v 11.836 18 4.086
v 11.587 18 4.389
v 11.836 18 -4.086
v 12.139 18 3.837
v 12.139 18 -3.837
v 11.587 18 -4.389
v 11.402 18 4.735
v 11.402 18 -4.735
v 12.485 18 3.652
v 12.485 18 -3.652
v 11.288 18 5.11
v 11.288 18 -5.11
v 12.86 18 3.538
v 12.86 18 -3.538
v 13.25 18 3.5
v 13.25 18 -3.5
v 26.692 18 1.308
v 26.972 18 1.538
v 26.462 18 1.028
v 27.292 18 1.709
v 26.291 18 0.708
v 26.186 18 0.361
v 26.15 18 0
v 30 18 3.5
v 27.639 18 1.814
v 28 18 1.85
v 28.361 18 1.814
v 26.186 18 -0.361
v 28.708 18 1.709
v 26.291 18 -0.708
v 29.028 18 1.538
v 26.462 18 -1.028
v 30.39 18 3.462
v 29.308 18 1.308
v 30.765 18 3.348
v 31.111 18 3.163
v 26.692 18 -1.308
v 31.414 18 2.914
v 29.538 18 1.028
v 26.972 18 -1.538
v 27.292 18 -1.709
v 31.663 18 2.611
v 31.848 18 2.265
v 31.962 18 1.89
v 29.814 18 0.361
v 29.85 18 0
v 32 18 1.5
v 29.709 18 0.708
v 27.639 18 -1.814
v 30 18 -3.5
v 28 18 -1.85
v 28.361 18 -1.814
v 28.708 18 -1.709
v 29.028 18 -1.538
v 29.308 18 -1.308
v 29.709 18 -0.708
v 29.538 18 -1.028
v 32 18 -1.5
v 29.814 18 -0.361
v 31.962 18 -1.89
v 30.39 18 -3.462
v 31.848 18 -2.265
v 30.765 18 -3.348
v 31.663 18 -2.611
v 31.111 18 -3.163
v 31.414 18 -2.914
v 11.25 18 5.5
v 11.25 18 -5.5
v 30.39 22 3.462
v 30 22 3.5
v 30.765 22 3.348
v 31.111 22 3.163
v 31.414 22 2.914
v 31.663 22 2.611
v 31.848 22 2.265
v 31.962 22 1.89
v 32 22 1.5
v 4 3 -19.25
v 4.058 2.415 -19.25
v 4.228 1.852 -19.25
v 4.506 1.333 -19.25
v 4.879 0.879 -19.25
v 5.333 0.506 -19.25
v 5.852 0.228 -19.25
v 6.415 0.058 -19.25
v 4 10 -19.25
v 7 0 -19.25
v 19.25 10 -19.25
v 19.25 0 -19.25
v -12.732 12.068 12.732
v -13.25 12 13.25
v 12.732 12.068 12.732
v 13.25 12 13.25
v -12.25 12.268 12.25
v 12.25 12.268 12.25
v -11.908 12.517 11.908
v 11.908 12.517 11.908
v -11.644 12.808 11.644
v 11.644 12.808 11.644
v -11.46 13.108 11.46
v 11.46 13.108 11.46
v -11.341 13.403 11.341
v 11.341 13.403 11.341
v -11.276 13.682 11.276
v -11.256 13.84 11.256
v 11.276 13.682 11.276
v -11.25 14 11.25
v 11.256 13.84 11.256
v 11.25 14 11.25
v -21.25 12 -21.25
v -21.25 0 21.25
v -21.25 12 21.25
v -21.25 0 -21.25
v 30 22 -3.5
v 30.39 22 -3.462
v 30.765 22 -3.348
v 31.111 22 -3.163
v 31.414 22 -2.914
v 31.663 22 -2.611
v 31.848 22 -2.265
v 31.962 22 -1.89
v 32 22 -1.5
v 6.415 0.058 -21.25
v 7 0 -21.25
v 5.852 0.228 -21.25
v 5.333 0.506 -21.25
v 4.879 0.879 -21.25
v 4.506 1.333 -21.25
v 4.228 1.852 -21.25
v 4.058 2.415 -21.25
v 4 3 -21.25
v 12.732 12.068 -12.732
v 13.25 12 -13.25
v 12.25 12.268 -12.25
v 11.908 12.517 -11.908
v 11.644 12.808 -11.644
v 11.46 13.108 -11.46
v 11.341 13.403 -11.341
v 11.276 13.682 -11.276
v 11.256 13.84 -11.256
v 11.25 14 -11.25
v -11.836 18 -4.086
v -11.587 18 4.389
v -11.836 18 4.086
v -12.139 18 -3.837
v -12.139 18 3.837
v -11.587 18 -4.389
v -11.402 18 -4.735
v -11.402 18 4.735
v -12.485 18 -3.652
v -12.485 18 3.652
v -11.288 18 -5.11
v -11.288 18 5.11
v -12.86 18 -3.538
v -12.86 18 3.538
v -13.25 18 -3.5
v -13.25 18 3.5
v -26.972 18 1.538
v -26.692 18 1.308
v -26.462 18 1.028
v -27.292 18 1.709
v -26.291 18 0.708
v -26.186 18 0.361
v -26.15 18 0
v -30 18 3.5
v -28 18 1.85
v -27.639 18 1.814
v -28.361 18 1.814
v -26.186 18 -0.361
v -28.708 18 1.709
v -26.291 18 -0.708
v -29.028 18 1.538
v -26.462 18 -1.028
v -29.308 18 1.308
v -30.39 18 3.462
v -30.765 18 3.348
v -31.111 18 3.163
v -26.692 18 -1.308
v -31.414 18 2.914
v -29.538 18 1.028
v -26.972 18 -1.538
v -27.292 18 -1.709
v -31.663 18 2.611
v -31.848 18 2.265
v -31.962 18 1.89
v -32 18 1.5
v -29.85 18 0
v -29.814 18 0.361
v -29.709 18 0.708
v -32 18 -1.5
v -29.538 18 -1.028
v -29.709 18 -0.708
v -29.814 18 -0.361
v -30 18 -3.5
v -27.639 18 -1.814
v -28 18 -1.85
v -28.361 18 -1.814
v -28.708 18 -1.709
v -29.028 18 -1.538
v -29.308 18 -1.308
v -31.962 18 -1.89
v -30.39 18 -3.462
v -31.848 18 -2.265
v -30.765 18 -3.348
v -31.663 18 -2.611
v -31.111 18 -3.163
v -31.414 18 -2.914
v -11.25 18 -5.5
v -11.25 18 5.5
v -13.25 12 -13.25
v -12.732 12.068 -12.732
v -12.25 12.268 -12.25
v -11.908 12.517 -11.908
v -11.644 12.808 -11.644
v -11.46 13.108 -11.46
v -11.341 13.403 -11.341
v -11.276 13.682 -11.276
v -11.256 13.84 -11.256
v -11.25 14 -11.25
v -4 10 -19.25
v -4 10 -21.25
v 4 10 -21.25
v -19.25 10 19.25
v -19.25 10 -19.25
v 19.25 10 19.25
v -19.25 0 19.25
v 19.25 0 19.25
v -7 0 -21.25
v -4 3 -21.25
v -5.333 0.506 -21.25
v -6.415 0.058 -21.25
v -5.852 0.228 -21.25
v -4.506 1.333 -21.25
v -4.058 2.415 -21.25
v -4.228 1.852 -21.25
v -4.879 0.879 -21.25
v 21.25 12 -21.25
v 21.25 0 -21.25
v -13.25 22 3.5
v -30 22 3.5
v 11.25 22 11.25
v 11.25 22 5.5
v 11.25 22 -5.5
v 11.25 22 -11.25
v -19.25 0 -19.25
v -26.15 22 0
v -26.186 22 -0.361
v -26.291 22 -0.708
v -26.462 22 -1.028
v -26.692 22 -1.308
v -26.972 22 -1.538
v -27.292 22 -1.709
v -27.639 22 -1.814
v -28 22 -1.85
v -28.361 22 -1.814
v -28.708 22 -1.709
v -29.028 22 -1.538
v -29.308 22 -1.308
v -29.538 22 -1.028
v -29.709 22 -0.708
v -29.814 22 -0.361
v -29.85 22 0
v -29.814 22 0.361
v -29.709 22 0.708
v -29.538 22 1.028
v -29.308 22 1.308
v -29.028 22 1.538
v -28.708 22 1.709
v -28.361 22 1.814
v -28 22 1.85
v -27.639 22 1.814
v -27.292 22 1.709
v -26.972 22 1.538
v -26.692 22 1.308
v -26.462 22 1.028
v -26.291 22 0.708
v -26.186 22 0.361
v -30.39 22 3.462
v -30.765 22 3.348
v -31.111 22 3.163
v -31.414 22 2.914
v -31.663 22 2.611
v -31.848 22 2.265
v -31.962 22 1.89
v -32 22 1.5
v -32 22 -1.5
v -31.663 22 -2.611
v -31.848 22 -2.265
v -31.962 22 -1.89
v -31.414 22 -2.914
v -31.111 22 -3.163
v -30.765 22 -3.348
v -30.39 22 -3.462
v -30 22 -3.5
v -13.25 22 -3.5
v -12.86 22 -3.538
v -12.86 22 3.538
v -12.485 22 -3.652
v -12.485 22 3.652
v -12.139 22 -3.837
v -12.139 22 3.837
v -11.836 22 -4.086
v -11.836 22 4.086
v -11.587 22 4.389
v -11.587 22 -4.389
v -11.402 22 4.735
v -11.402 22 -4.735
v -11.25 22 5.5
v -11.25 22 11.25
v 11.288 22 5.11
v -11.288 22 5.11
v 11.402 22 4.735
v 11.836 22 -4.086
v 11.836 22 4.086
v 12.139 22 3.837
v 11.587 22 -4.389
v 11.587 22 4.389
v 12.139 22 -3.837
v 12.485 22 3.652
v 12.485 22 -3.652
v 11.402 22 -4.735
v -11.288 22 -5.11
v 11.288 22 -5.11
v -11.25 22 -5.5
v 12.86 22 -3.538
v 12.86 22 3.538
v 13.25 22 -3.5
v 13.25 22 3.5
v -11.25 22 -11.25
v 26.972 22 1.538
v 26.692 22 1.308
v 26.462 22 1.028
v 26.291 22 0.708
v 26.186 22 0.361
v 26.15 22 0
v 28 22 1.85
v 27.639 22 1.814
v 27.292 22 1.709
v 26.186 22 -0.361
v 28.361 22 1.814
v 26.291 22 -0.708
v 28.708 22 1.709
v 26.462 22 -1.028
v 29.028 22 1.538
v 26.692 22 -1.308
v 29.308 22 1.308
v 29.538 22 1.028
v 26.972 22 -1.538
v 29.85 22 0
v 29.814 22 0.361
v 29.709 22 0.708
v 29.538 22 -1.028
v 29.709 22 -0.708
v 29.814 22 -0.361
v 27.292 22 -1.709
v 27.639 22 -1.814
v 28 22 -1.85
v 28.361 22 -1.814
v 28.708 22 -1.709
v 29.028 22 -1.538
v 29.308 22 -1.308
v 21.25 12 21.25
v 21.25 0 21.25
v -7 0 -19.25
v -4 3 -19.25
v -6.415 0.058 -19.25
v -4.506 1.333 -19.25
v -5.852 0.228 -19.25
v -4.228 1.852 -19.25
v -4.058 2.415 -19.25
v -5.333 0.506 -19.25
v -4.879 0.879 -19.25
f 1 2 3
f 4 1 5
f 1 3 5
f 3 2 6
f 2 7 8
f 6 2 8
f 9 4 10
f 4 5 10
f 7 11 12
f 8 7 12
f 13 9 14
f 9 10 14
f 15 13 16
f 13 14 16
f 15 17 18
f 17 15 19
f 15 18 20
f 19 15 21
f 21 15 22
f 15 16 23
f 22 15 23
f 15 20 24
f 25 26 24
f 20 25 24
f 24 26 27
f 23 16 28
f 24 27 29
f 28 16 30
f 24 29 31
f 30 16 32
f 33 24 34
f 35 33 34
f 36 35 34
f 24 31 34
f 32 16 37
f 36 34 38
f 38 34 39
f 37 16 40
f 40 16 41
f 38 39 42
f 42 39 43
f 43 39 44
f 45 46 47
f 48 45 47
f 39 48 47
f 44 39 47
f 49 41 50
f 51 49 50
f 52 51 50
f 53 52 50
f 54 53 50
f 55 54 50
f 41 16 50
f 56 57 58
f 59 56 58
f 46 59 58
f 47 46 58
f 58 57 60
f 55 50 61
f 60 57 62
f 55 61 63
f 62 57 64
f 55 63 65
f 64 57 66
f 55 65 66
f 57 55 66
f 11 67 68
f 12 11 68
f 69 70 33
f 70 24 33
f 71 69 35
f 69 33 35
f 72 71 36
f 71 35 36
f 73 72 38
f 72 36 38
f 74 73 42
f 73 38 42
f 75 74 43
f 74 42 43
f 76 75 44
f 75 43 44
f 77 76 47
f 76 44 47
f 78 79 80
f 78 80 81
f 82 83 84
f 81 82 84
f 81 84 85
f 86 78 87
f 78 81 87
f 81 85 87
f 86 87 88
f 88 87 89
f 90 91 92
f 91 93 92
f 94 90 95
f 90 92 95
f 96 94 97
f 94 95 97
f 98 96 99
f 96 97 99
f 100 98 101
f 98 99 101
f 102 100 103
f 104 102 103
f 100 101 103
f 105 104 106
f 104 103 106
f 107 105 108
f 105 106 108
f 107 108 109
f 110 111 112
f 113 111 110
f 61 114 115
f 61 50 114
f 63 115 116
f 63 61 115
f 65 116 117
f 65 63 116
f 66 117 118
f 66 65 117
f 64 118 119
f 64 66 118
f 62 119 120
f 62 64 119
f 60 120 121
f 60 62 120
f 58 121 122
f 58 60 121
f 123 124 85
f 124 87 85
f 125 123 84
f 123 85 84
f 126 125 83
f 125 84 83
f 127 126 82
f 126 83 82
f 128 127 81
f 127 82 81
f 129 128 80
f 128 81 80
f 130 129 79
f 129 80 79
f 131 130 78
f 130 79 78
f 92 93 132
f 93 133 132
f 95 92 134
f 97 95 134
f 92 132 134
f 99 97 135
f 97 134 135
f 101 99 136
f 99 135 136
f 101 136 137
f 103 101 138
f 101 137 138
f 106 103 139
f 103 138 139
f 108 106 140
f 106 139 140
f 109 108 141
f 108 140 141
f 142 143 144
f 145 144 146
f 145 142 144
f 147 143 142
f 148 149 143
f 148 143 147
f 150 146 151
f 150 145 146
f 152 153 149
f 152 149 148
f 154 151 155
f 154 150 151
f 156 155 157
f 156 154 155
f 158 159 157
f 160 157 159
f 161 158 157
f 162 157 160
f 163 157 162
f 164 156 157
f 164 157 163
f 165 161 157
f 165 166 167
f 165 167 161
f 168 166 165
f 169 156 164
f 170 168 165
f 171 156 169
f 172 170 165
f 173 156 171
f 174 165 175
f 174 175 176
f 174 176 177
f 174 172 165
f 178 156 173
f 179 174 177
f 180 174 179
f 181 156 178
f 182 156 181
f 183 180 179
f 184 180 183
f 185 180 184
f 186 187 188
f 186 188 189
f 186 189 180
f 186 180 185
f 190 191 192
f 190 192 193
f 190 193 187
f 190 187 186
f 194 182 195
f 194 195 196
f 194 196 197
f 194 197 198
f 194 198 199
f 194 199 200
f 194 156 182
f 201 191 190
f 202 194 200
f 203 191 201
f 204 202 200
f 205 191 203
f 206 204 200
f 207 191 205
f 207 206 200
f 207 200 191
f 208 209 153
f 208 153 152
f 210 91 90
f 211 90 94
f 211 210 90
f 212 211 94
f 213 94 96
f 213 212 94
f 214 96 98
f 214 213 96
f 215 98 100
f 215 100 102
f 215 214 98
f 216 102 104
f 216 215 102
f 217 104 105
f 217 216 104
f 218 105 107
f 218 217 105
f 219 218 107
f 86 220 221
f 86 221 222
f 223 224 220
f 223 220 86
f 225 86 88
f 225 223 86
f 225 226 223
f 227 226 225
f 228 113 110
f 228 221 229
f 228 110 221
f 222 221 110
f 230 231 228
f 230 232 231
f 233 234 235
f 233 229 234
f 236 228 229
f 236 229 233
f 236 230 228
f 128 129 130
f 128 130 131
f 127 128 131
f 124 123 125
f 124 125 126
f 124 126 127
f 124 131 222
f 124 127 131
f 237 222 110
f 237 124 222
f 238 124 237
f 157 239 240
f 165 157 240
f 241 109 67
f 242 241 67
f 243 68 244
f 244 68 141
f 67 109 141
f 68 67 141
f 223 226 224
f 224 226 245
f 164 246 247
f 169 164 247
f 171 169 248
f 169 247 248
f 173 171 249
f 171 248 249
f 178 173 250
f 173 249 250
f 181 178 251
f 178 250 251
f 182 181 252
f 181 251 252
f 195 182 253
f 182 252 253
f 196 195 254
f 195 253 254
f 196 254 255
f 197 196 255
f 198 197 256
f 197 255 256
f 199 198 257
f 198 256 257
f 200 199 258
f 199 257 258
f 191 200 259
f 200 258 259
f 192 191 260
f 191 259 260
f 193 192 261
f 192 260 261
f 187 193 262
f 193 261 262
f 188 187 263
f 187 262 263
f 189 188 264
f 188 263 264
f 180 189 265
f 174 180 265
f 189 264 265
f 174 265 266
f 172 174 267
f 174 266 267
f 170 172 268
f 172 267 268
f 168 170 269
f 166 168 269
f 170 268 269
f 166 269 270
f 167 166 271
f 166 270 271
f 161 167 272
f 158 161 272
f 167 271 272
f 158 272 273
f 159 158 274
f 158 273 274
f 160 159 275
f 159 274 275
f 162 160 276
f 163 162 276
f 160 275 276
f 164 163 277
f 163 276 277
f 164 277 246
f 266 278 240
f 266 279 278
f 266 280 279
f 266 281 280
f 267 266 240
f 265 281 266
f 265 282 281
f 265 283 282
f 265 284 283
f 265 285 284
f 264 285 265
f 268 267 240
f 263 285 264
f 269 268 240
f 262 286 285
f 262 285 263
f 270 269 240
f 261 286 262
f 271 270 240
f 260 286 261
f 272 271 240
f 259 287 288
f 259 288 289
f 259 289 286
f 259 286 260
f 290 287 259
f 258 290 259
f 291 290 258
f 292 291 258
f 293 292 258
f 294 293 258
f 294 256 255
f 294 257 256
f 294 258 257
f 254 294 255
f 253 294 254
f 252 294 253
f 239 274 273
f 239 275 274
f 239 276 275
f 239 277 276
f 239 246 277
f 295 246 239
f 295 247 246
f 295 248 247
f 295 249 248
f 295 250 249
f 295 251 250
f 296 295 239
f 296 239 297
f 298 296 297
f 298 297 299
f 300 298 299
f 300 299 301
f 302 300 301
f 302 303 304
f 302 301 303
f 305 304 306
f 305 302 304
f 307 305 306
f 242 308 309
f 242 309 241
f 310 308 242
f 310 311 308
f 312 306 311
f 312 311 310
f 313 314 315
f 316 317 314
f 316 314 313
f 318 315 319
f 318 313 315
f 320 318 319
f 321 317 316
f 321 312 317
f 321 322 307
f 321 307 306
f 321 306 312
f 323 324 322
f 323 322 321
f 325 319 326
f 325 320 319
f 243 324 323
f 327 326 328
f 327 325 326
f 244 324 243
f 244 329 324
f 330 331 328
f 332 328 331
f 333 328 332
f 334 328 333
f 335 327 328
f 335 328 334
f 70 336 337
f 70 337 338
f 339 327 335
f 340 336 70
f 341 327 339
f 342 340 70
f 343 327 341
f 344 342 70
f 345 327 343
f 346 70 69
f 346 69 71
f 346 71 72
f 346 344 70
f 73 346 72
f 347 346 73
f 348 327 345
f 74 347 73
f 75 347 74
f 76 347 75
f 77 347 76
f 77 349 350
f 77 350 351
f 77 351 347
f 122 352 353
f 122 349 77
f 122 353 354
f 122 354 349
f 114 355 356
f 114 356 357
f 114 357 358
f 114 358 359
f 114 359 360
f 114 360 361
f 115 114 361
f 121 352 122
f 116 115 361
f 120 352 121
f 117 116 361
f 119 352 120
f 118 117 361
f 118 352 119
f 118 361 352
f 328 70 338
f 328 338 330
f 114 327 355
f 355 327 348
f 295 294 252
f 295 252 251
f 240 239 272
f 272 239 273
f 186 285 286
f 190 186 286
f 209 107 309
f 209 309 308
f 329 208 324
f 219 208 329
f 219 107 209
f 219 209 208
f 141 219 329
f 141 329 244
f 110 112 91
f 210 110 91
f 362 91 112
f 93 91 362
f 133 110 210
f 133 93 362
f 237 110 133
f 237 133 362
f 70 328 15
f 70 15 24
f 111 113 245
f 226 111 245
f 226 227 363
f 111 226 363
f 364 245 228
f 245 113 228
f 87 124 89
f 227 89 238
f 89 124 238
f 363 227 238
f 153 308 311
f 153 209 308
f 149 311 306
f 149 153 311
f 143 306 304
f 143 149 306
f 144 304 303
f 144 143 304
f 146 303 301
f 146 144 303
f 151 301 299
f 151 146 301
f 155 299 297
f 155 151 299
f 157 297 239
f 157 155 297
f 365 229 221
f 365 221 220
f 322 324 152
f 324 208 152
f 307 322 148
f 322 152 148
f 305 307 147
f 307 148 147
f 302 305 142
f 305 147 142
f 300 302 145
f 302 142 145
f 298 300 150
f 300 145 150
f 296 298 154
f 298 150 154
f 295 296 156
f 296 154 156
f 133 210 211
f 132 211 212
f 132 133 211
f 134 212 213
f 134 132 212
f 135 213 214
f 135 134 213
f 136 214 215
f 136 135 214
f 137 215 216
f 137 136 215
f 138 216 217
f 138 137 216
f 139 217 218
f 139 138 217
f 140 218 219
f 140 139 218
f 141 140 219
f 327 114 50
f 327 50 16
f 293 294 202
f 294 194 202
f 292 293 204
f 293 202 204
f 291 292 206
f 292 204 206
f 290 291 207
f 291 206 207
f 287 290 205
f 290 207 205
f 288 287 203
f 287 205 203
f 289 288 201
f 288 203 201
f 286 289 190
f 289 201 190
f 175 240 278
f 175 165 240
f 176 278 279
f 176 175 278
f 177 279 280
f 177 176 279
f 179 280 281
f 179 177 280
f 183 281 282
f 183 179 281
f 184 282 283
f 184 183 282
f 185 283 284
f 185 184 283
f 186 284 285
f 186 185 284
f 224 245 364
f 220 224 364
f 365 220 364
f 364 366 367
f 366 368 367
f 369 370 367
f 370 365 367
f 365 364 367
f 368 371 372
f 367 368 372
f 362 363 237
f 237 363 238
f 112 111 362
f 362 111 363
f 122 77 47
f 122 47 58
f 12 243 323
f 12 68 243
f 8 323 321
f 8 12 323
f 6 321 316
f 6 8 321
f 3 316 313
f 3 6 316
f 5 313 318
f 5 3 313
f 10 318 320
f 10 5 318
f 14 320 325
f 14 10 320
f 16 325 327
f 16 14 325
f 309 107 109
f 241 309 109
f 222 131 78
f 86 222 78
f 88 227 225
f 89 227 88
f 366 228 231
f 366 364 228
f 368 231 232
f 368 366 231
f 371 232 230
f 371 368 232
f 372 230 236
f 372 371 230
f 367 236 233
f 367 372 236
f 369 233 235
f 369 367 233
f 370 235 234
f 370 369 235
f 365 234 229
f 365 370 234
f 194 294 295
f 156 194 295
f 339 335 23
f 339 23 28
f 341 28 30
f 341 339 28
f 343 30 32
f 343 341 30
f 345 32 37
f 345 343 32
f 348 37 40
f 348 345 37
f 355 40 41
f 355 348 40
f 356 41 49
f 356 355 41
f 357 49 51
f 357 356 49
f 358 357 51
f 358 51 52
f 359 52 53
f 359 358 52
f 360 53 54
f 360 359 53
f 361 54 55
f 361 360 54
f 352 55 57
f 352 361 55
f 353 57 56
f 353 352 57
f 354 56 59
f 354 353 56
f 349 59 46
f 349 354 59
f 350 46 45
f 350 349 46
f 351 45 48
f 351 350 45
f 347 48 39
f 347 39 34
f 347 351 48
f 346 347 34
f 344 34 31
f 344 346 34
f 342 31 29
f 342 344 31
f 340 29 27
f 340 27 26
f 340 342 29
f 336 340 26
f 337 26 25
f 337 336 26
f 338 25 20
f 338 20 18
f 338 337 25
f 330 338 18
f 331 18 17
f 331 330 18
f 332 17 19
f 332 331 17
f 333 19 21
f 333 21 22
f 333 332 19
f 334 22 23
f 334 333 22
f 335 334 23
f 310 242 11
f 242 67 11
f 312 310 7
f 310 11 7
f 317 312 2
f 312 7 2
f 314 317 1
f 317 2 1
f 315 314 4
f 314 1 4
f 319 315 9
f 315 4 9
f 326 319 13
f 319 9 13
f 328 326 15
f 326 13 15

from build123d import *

# Parameters (mm, degrees)
SKETCH1_W           = 42.5
SKETCH1_H           = 42.5
SKETCH1_W_2         = 38.5
SKETCH1_H_2         = 38.5
BOSS_EXTRUDE1_DEPTH = 10
SKETCH2_W           = 42.5
SKETCH2_H           = 42.5
BOSS_EXTRUDE2_DEPTH = 2
SKETCH3_W           = 4
SKETCH3_H           = 2
CUT_EXTRUDE1_DEPTH  = 10
SKETCH5_W           = 22.5
SKETCH5_H           = 22.5
BOSS_EXTRUDE3_DEPTH = 10
BOSS_EXTRUDE4_DEPTH = 4
FILLET1_R           = 2
FILLET2_R           = 3


with BuildPart() as part:
    # Sketch1 → Boss-Extrude1 (new body)
    with BuildSketch(Plane(origin=(0, 0, 0), x_dir=(1, 0, 0), z_dir=(0, 1, 0))):
        Rectangle(SKETCH1_W, SKETCH1_H)
        Rectangle(SKETCH1_W_2, SKETCH1_H_2, mode=Mode.SUBTRACT)
    extrude(amount=BOSS_EXTRUDE1_DEPTH)

    # Sketch2 → Boss-Extrude2 (add)
    with BuildSketch(Plane(origin=(0, 10, 0), x_dir=(1, 0, 0), z_dir=(0, 1, 0))):
        Rectangle(SKETCH2_W, SKETCH2_H)
    extrude(amount=BOSS_EXTRUDE2_DEPTH)

    # Sketch3 → Cut-Extrude1 (cut)
    with BuildSketch(Plane.XZ):
        with Locations((-2, -20.25)):
            Rectangle(SKETCH3_W, SKETCH3_H)
        with Locations((2, -20.25)):
            Rectangle(SKETCH3_W, SKETCH3_H)
    extrude(amount=-CUT_EXTRUDE1_DEPTH, mode=Mode.SUBTRACT)

    # Sketch5 → Boss-Extrude3 (add)
    with BuildSketch(Plane(origin=(0, 12, 0), x_dir=(1, 0, 0), z_dir=(0, 1, 0))):
        Rectangle(SKETCH5_W, SKETCH5_H)
    extrude(amount=BOSS_EXTRUDE3_DEPTH)

    # Sketch6 → Boss-Extrude4 (add)
    with BuildSketch(Plane(origin=(0, 22, 0), x_dir=(1, 0, 0), z_dir=(0, 1, 0))):
        with BuildLine():
            Line((32, 0), (29.85, 0))
            ThreePointArc((29.85, 0), (28, -1.85), (26.15, 0))
            Line((26.15, 0), (11.25, 0))
            Line((11.25, 0), (11.25, -3.5))
            Line((11.25, -3.5), (32, -3.5))
            Line((32, -3.5), (32, 0))
        make_face()
        with BuildLine():
            ThreePointArc((26.15, 0), (28, 1.85), (29.85, 0))
            Line((29.85, 0), (32, 0))
            Line((32, 0), (32, 3.5))
            Line((32, 3.5), (11.25, 3.5))
            Line((11.25, 3.5), (11.25, 0))
            Line((11.25, 0), (26.15, 0))
        make_face()
    boss_extrude4 = extrude(amount=-BOSS_EXTRUDE4_DEPTH)

    # Mirror2: Boss-Extrude4 across plane
    add(boss_extrude4.mirror(Plane(origin=(0, 0, 0), x_dir=(0, 0, 1), z_dir=(1, 0, 0))))

    # Fillet1
    fillet1_edges = [part.edges().sort_by_distance(p)[0] for p in [
        (0, 12, -11.25),
        (-11.25, 12, 0),
        (0, 12, 11.25),
        (11.25, 12, 0),
        (11.25, 20, -3.5),
        (32, 20, -3.5),
        (32, 20, 3.5),
        (11.25, 20, 3.5),
        (-32, 20, -3.5),
        (-11.25, 20, -3.5),
        (-11.25, 20, 3.5),
        (-32, 20, 3.5),
    ]]
    fillet(fillet1_edges, radius=FILLET1_R)

    # Fillet2
    fillet2_edges = [part.edges().sort_by_distance(p)[0] for p in [
        (4, 0, -20.25),
        (-4, 0, -20.25),
    ]]
    fillet(fillet2_edges, radius=FILLET2_R)


solid = part.part
